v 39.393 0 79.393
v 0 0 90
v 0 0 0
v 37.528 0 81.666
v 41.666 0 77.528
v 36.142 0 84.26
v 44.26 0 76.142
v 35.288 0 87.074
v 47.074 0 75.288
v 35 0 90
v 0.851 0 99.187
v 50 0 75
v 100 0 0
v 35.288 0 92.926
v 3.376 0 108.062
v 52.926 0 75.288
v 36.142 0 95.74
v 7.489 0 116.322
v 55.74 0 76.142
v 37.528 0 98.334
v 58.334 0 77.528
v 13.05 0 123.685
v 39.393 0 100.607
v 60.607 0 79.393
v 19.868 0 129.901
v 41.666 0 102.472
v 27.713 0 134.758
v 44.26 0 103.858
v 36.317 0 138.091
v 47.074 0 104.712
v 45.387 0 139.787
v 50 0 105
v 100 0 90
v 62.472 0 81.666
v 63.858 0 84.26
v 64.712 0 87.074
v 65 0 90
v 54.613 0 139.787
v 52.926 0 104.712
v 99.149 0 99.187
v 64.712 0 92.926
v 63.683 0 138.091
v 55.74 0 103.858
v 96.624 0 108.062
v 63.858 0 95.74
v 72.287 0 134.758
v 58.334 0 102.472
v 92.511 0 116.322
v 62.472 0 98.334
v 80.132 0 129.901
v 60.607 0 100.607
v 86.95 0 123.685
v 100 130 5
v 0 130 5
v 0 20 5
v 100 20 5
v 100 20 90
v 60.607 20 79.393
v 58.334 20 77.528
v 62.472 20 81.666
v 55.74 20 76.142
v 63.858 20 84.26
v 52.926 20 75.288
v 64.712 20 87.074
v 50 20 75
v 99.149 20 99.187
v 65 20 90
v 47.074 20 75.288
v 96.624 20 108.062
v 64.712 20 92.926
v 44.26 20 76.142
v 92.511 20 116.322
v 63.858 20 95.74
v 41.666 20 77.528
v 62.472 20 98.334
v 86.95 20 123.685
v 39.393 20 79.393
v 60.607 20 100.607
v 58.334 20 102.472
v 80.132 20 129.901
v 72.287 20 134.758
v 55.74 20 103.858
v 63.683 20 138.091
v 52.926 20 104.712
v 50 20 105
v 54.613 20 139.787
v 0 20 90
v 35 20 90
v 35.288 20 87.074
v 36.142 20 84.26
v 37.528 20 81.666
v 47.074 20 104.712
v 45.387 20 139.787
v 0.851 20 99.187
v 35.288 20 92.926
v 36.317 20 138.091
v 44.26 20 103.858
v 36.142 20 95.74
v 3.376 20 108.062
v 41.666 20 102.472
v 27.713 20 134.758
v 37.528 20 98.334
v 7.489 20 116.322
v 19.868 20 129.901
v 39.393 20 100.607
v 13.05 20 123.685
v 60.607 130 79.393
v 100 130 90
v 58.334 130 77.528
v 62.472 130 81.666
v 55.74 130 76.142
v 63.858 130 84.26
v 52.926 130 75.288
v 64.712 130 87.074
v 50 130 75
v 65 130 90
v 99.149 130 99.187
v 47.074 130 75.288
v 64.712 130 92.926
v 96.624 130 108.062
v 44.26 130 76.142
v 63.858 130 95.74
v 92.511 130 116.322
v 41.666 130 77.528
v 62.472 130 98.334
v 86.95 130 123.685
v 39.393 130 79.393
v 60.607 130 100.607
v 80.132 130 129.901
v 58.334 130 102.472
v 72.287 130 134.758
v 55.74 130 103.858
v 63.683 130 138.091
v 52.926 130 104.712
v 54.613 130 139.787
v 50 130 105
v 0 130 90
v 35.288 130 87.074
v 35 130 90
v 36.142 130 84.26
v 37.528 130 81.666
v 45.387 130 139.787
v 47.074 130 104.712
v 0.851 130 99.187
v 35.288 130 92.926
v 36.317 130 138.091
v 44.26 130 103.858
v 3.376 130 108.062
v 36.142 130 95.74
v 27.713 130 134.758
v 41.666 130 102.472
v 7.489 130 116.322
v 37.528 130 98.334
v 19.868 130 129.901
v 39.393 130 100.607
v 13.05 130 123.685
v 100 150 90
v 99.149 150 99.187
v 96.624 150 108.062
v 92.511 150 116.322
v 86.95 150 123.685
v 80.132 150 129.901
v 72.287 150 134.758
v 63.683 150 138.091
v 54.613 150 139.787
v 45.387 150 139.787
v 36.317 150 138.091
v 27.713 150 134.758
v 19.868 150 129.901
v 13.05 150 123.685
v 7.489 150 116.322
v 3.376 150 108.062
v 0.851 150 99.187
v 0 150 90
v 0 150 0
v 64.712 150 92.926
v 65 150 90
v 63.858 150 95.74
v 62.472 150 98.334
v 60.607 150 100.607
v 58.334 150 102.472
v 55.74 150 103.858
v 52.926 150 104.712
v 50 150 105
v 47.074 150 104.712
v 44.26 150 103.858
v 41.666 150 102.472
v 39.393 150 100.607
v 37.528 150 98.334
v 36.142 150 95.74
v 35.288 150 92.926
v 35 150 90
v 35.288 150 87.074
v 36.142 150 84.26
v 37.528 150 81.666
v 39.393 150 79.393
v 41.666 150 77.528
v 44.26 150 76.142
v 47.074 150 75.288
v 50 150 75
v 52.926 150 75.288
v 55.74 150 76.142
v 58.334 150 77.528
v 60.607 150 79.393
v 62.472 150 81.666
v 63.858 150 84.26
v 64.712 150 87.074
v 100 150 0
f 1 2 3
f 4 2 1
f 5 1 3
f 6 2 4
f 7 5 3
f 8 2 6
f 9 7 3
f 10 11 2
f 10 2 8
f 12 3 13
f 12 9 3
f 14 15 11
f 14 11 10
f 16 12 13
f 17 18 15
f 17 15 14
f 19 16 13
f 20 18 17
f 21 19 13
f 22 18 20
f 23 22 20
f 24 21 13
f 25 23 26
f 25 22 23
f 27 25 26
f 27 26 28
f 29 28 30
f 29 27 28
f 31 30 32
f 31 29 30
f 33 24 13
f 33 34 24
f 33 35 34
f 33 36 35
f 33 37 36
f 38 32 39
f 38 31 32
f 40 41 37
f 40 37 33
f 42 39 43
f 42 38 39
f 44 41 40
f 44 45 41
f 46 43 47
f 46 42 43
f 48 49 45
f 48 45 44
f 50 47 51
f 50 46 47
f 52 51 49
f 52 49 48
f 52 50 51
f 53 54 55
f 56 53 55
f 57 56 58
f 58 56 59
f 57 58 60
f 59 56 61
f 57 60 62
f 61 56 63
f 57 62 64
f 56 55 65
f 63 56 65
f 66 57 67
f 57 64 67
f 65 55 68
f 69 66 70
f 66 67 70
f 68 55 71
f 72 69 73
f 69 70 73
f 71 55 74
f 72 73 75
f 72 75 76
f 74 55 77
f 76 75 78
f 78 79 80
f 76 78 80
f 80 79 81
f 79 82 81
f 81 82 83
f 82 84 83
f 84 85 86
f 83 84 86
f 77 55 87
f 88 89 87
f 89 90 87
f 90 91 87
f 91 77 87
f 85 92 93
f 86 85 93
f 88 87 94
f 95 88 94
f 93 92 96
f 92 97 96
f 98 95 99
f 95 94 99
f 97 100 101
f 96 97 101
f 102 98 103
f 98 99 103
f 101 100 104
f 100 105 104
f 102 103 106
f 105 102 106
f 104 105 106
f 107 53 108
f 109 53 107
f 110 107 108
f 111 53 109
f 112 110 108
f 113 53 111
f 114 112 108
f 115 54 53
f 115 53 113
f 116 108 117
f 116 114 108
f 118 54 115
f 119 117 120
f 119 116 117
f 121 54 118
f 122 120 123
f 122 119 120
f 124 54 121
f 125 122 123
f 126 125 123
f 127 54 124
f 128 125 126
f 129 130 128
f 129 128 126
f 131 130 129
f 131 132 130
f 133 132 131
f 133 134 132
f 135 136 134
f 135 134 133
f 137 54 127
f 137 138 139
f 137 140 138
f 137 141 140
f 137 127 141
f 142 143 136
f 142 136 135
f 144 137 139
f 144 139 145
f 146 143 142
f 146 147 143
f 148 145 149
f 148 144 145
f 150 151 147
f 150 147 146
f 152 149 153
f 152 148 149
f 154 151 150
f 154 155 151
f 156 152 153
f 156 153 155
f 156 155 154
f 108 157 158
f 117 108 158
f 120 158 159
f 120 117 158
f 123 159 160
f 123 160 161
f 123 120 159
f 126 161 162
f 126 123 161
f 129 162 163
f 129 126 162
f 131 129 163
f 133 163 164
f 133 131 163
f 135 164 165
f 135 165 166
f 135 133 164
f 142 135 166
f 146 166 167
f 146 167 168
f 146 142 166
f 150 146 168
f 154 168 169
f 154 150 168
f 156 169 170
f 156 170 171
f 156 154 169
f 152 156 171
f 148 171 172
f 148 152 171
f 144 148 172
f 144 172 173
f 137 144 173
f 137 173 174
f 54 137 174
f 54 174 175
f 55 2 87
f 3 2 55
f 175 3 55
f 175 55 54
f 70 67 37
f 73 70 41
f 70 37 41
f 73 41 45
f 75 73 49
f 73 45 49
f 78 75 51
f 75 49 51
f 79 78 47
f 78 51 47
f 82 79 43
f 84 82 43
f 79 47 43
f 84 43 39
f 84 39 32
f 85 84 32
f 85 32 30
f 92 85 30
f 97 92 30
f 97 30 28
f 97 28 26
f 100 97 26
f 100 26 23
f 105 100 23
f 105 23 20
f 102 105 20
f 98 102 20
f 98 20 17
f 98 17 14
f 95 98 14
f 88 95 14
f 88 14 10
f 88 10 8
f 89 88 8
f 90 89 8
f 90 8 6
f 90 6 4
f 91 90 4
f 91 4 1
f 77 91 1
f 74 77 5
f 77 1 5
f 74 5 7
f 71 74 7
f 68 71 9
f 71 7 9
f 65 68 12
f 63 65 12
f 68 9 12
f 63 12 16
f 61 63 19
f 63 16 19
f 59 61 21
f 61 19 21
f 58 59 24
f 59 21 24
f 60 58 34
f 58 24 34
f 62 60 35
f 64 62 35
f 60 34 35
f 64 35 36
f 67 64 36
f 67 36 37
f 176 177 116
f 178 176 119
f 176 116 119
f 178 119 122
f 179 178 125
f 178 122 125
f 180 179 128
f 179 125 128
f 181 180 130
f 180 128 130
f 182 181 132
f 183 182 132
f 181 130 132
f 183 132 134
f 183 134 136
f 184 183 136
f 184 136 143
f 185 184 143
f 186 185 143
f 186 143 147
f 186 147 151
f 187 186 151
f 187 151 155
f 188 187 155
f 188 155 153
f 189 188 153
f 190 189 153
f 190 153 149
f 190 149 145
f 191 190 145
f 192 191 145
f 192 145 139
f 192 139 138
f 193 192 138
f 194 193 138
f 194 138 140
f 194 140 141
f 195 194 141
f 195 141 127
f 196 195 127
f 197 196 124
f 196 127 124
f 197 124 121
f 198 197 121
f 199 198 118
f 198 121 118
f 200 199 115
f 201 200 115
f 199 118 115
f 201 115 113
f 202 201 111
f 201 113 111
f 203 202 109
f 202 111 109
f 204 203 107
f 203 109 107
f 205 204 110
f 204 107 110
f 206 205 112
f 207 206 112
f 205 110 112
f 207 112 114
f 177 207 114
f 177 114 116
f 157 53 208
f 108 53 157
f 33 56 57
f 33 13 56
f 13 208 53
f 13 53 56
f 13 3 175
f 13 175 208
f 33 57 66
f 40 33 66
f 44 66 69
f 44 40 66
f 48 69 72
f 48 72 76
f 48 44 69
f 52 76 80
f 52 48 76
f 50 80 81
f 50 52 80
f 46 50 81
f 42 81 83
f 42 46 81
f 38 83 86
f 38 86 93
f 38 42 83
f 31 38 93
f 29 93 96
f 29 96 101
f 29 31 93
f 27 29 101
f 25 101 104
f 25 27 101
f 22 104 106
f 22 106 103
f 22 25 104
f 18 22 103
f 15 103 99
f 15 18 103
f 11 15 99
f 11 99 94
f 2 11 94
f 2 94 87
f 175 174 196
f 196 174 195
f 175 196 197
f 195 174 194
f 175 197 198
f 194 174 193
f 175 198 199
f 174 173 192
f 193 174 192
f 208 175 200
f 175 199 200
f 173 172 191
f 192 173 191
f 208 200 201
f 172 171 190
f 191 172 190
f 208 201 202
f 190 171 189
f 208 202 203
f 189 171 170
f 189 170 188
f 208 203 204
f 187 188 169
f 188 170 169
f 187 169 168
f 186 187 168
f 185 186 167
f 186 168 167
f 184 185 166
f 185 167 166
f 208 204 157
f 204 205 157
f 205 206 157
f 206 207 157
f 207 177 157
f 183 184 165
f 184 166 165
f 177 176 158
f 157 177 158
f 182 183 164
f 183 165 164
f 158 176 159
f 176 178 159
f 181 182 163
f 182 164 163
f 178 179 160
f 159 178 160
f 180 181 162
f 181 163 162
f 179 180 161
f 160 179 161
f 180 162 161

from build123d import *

# Parameters (mm, degrees)
F0_R     = 15
F0_W     = 100
F0_H     = 5
F2_DEPTH = 150
F1_W     = 20
F1_H     = 200
F3_DEPTH = 116.7


with BuildPart() as f2:
    # F0 (on Front) → F2 (new body)
    with BuildSketch(Plane.XZ):
        with BuildLine():
            Line((0, 90), (0, 5))
            Line((0, 5), (100, 5))
            Line((100, 5), (100, 90))
            ThreePointArc((100, 90), (50, 140), (0, 90))
        make_face()
        with Locations((50, 90)):
            Circle(F0_R, mode=Mode.SUBTRACT)
        with Locations((50, 2.5)):
            Rectangle(F0_W, F0_H)
    extrude(amount=-F2_DEPTH)

    # F1 (on Right) → F3 (intersect)
    with BuildSketch(Plane.YZ):
        Polygon((0, 5), (0, 0), (150, 0), (150, 5), (130, 5), (20, 5), align=None)
        with Locations((10, 105)):
            Rectangle(F1_W, F1_H)
        with Locations((140, 105)):
            Rectangle(F1_W, F1_H)
    extrude(amount=F3_DEPTH, mode=Mode.INTERSECT)


solid = f2.part
